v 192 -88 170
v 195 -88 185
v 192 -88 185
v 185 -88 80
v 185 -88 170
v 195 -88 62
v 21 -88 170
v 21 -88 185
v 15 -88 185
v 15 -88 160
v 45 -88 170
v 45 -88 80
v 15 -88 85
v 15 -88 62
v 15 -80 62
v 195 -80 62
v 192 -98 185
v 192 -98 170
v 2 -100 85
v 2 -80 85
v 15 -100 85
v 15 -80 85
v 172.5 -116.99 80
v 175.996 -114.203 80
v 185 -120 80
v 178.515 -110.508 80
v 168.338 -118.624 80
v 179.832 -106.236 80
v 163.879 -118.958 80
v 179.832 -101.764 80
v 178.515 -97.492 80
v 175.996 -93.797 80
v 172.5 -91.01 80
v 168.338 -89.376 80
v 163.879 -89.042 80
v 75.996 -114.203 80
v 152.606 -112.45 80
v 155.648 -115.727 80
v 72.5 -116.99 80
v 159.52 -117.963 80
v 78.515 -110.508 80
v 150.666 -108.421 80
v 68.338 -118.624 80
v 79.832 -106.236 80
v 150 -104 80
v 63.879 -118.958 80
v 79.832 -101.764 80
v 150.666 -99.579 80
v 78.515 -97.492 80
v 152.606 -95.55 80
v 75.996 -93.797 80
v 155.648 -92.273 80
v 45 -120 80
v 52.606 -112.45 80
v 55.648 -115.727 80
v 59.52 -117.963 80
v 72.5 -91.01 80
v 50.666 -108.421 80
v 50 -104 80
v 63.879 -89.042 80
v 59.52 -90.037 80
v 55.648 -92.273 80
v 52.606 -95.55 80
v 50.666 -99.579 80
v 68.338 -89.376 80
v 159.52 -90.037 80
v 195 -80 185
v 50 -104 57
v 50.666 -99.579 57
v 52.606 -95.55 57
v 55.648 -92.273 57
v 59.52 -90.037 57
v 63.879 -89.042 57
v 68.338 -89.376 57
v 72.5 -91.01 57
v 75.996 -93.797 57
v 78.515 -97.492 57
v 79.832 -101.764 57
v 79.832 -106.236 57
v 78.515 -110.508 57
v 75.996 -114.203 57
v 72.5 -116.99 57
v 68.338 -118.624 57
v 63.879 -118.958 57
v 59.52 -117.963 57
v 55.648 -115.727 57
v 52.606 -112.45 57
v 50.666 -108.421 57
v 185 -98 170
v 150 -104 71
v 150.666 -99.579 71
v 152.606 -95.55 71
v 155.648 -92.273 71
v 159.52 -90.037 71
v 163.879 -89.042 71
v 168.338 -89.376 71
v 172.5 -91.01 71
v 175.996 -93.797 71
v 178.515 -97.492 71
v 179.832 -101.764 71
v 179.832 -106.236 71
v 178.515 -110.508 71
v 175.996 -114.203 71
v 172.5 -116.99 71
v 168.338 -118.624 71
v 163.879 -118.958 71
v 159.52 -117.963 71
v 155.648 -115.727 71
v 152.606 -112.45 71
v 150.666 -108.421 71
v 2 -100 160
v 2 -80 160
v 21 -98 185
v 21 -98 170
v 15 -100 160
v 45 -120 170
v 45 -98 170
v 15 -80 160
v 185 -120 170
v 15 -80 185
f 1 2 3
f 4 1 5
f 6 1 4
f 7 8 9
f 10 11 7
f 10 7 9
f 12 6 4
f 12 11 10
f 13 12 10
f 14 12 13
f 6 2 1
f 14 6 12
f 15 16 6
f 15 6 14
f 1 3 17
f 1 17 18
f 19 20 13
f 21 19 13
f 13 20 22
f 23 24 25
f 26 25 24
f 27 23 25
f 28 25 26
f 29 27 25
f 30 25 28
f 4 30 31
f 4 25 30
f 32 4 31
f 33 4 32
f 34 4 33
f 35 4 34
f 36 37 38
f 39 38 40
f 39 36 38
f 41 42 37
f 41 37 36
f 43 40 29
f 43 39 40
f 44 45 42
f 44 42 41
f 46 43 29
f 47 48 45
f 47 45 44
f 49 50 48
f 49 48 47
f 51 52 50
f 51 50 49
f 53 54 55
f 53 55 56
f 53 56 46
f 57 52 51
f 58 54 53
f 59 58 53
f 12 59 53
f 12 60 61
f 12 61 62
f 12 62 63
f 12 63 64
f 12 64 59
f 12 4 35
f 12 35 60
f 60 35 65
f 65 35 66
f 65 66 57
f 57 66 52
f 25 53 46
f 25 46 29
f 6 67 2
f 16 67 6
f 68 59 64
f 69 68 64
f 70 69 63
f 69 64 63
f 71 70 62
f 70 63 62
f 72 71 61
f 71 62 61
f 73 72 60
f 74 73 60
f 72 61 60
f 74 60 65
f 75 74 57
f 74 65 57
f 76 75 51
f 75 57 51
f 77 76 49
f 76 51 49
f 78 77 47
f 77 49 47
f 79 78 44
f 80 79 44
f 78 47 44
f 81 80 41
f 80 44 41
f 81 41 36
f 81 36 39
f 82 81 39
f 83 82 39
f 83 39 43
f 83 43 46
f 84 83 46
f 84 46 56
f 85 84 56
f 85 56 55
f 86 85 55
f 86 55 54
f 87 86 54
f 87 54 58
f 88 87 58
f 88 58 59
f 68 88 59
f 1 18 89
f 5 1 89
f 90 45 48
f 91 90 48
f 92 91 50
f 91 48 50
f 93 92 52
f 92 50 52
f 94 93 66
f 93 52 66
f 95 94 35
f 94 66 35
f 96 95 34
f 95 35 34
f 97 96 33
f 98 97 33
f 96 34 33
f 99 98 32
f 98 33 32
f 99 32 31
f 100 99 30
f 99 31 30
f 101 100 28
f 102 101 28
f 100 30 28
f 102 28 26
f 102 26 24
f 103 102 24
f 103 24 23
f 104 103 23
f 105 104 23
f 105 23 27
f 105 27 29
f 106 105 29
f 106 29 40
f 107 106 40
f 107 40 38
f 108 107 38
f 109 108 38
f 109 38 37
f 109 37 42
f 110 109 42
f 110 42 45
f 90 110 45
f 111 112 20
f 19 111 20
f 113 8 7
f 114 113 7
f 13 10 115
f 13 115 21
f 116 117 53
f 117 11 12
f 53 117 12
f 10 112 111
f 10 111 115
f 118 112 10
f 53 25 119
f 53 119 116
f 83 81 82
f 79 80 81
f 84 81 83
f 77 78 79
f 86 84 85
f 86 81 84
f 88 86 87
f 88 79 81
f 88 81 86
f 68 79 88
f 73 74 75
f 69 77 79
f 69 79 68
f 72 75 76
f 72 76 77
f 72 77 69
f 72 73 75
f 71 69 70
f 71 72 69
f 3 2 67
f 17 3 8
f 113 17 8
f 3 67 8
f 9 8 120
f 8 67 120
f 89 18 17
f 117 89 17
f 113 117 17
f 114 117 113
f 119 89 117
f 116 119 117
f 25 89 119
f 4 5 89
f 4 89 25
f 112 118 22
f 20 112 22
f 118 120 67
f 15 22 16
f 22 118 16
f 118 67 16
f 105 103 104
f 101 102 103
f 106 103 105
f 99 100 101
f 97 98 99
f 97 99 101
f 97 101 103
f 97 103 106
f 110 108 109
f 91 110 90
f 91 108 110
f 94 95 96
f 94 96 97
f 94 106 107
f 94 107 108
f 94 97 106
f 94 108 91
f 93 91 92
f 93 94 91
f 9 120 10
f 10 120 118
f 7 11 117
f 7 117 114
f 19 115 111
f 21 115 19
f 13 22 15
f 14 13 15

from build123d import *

# Parameters (mm, degrees)
BOX044_W                  = 180
BOX044_H                  = 123
BOX044_DEPTH              = 8
BOX045_W                  = 140
BOX045_H                  = 90
BOX045_DEPTH              = 40
CYLINDER019_R             = 15
CYLINDER019_DEPTH         = 10
CYLINDER020_R             = 15
CYLINDER020_DEPTH         = 24
BOX046_W                  = 75
BOX046_H                  = 13
BOX046_DEPTH              = 20
BOX047_W                  = 171
BOX047_H                  = 15
BOX047_DEPTH              = 10
FUSION013_ROLL_ANGLE      = -90
FUSION013_PLACEMENT_ANGLE = -180


with BuildPart() as cube039:
    # Box044 → Box044 (new body)
    with BuildSketch(Plane.XY):
        with Locations((90, 61.5)):
            Rectangle(BOX044_W, BOX044_H)
    extrude(amount=BOX044_DEPTH)


with BuildPart() as cube040:
    # Box045 → Box045 (new body)
    with BuildSketch(Plane(origin=(10, 15, 0), x_dir=(1, 0, 0), z_dir=(0, 0, 1))):
        with Locations((70, 45)):
            Rectangle(BOX045_W, BOX045_H)
    extrude(amount=BOX045_DEPTH)


with BuildPart() as cylinder019:
    # Cylinder019 → Cylinder019 (new body)
    with BuildSketch(Plane(origin=(30, 104, 24), x_dir=(1, 0, 0), z_dir=(0, 1, 0))):
        Circle(CYLINDER019_R)
    extrude(amount=CYLINDER019_DEPTH)


with BuildPart() as cylinder020:
    # Cylinder020 → Cylinder020 (new body)
    with BuildSketch(Plane(origin=(130, 104, 24), x_dir=(1, 0, 0), z_dir=(0, 1, 0))):
        Circle(CYLINDER020_R)
    extrude(amount=CYLINDER020_DEPTH)


with BuildPart() as cube041:
    # Box046 → Box046 (new body)
    with BuildSketch(Plane(origin=(193, 25, 0), x_dir=(0, 1, 0), z_dir=(0, 0, 1))):
        with Locations((37.5, 6.5)):
            Rectangle(BOX046_W, BOX046_H)
    extrude(amount=BOX046_DEPTH)


with BuildPart() as f_120_back:
    # Box047 → Box047 (new body)
    with BuildSketch(Plane(origin=(3, 0, 8), x_dir=(1, 0, 0), z_dir=(0, 0, 1))):
        with Locations((85.5, 7.5)):
            Rectangle(BOX047_W, BOX047_H)
    extrude(amount=BOX047_DEPTH)

    # Fusion013: union Cube039, Cube040, Cylinder019, Cylinder020, Cube041
    add(cube039.part)
    add(cube040.part)
    add(cylinder019.part)
    add(cylinder020.part)
    add(cube041.part)


with BuildPart() as f_120_back_1:
    # Fusion013 roll: moved
    add(f_120_back.part.rotate(Axis((0, 0, 0), (1, 0, 0)), FUSION013_ROLL_ANGLE))


with BuildPart() as f_120_back_2:
    # Fusion013 placement: moved
    add(f_120_back_1.part.moved(Location((195, -80, 185))).rotate(Axis((195, -80, 185), (0, 0, 1)), FUSION013_PLACEMENT_ANGLE))


solid = f_120_back_2.part
